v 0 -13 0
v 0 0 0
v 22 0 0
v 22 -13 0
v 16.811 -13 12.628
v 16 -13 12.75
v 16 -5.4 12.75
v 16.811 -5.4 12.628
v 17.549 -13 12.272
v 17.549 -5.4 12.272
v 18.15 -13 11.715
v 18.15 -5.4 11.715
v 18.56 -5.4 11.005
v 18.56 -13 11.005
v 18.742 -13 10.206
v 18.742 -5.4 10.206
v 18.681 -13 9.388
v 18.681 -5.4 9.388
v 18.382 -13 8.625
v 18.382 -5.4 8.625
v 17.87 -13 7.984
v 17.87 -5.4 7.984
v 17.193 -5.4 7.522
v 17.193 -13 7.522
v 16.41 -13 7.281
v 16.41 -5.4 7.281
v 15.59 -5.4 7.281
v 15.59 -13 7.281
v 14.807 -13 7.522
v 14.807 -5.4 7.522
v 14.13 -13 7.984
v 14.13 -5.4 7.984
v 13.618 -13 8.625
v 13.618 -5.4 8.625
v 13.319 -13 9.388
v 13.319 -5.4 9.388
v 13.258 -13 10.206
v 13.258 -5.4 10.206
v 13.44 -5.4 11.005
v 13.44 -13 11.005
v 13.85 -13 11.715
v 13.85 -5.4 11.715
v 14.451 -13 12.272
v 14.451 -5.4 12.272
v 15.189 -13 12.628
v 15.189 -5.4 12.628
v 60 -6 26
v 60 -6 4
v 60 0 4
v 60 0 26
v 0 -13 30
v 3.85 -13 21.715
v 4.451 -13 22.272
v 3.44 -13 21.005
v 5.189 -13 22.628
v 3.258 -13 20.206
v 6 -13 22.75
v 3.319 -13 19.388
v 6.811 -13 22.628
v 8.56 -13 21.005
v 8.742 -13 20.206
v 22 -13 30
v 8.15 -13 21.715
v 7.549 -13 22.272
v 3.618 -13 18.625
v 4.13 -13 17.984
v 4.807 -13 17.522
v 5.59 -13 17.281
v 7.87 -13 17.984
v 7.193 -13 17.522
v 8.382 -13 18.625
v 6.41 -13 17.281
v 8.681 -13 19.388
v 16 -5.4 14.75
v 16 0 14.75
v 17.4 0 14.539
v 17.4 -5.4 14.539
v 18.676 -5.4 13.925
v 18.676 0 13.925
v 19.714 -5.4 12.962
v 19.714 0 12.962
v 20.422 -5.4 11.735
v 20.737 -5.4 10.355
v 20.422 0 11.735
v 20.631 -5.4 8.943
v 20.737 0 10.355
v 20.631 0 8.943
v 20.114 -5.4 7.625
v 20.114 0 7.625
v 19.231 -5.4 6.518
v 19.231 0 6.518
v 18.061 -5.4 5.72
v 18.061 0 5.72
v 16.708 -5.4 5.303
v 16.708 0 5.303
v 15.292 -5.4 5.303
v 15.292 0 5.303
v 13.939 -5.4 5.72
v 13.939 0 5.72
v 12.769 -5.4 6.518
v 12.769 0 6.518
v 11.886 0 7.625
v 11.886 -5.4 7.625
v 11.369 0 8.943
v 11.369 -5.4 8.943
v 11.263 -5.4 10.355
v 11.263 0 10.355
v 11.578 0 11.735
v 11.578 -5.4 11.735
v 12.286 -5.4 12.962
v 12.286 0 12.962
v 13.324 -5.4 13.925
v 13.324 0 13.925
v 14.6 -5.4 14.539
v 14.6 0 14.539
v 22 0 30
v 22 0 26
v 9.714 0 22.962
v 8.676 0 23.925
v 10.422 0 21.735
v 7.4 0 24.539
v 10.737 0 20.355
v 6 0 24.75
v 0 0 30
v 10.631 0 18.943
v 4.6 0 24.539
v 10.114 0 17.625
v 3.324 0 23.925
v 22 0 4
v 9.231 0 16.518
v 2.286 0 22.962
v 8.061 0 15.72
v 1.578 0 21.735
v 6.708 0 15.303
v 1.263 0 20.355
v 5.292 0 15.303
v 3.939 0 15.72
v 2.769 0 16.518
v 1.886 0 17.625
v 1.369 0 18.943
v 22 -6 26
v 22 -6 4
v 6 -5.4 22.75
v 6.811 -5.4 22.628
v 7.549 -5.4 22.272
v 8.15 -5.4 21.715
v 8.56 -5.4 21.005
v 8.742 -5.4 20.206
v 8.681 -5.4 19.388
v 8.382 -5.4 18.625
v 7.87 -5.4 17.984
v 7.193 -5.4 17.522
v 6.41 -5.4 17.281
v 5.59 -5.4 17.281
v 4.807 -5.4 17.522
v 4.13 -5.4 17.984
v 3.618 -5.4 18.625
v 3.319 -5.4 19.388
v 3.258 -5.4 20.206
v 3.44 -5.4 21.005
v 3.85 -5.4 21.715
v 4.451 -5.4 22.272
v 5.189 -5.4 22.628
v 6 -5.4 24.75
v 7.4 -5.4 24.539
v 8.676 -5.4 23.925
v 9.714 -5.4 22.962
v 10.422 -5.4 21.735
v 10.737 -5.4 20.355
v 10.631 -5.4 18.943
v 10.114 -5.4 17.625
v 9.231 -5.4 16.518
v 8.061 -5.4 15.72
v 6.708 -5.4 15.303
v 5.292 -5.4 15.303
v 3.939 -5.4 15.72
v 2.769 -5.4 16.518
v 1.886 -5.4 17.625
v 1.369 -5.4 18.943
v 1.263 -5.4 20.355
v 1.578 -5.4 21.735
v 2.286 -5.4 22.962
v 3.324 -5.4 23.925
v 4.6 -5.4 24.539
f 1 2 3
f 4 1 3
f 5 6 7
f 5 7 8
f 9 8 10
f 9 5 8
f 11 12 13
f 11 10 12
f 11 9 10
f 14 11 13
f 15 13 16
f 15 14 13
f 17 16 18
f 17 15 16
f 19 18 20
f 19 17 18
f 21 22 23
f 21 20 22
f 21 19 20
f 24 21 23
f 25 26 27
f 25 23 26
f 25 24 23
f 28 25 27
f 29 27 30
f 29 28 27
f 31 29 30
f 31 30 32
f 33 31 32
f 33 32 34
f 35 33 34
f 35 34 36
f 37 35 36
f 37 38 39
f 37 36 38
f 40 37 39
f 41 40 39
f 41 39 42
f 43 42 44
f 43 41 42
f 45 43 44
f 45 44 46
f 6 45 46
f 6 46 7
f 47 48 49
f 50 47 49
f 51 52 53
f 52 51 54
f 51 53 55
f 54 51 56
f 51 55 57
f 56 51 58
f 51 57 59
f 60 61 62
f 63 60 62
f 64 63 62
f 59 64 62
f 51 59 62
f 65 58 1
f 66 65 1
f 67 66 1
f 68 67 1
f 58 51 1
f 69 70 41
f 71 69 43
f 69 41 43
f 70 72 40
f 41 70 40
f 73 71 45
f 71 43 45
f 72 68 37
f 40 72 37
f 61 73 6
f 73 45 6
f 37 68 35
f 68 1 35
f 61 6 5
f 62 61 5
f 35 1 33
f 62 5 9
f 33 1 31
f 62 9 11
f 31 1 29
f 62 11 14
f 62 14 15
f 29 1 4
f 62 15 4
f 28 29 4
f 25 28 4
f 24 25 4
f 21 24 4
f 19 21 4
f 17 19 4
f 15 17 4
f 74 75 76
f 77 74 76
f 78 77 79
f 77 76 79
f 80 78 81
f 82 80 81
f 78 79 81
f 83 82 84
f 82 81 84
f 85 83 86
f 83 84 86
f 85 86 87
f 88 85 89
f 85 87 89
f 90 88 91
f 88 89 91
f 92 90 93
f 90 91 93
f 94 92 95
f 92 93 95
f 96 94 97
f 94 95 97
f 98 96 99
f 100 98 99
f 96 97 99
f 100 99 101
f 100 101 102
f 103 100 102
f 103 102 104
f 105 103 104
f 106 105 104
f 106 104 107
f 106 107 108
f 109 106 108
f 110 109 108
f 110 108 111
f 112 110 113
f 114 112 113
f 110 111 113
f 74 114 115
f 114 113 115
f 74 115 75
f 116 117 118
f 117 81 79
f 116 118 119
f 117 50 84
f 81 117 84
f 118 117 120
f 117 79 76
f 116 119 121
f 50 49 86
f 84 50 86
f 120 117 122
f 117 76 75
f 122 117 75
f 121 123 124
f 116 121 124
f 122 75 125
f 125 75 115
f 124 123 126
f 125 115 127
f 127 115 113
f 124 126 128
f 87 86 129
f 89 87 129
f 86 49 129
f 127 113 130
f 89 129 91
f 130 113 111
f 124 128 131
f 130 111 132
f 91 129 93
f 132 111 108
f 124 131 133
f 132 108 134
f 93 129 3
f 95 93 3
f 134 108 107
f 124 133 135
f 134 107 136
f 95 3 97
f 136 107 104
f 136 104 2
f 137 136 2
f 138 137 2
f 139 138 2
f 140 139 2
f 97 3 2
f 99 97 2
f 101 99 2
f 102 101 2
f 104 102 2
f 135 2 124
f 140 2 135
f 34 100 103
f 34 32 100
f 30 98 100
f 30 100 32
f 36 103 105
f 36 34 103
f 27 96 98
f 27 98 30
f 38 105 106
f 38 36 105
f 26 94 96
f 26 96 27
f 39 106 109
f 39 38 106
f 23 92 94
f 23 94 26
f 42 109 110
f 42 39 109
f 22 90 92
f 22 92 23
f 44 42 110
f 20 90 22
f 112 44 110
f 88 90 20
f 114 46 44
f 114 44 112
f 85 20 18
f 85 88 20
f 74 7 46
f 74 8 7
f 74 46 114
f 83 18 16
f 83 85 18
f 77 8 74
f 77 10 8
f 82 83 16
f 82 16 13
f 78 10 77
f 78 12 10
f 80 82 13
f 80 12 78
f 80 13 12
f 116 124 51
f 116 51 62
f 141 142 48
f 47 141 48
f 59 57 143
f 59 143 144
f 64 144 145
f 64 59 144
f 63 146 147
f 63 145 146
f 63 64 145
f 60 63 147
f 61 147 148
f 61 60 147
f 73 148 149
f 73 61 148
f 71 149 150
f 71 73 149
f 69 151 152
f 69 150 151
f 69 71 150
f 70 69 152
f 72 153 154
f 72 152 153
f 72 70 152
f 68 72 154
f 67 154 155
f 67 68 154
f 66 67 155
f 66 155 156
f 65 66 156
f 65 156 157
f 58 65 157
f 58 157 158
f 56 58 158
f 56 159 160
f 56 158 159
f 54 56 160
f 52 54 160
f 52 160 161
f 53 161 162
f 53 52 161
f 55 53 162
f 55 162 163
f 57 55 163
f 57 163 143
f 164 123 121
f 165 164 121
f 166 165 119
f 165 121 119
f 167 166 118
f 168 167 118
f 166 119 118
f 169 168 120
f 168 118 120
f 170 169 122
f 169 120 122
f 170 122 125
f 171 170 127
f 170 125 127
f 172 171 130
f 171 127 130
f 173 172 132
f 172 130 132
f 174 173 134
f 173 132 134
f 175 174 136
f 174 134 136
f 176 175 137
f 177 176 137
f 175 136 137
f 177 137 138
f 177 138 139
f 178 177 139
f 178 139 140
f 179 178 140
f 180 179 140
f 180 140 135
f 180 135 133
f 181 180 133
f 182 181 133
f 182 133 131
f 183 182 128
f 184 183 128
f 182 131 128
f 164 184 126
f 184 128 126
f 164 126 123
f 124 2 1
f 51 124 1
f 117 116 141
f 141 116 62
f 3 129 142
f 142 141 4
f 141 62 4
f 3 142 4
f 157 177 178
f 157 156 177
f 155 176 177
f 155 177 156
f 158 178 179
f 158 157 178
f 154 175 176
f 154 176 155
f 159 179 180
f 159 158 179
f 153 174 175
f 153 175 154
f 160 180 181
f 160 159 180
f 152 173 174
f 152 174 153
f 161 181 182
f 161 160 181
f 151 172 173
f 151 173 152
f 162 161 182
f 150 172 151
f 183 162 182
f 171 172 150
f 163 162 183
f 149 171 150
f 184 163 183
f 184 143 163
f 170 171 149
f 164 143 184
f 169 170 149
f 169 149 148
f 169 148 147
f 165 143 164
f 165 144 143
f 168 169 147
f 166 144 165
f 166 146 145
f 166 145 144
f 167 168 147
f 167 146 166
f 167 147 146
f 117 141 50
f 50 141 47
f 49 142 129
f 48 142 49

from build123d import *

# Parameters (mm, degrees)
ESBO_O1_W                  = 38
ESBO_O1_H                  = 6
RESSALTO_EXTRUS_O1_DEPTH   = 30
CORTE_EXTRUS_O1_DEPTH      = 69.330081223
CORTE_EXTRUS_O1_DEPTH_BACK = 69.330081223
ESBO_O2_W                  = 38
ESBO_O2_H                  = 4
CORTE_EXTRUS_O2_DEPTH      = 69.330081223
CORTE_EXTRUS_O2_DEPTH_BACK = 69.330081223
ESBO_O4_R                  = 2.75
ESBO_O5_R                  = 4.75
CORTE_EXTRUS_O3_DEPTH      = 5.4


with BuildPart() as part:
    # Esboço1 → Ressalto-extrusão1 (new body)
    with BuildSketch(Plane.XY):
        Polygon((22, 0), (0, 0), (0, -13), (22, -13), (22, -6), align=None)
        with Locations((41, -3)):
            Rectangle(ESBO_O1_W, ESBO_O1_H)
    extrude(amount=RESSALTO_EXTRUS_O1_DEPTH)

    # Esboço2 → Corte-extrusão1 (cut, two sides: drawn at the far end of the back side and taken through both)
    with BuildSketch(Plane(origin=(0, 0, 0), x_dir=(1, 0, 0), z_dir=(0, 1, 0)).offset(-CORTE_EXTRUS_O1_DEPTH_BACK)):
        with Locations((41, -2)):
            Rectangle(ESBO_O2_W, ESBO_O2_H)
        with Locations((41, -28)):
            Rectangle(ESBO_O2_W, ESBO_O2_H)
    extrude(amount=CORTE_EXTRUS_O1_DEPTH + CORTE_EXTRUS_O1_DEPTH_BACK, mode=Mode.SUBTRACT)

    # Esboço4 → Corte-extrusão2 (cut, two sides: drawn at the far end of the back side and taken through both)
    with BuildSketch(Plane(origin=(0, 0, 0), x_dir=(1, 0, 0), z_dir=(0, 1, 0)).offset(-CORTE_EXTRUS_O2_DEPTH_BACK)):
        with Locations(Location((6, -20, 0), (0, 0, 270))):
            Circle(ESBO_O4_R)
        with Locations(Location((16, -10, 0), (0, 0, 270))):
            Circle(ESBO_O4_R)
    extrude(amount=CORTE_EXTRUS_O2_DEPTH + CORTE_EXTRUS_O2_DEPTH_BACK, mode=Mode.SUBTRACT)

    # Esboço5 → Corte-extrusão3 (cut)
    with BuildSketch(Plane(origin=(0, 0, 0), x_dir=(1, 0, 0), z_dir=(0, 1, 0))):
        with Locations(Location((6, -20, 0), (0, 0, 270))):
            Circle(ESBO_O5_R)
        with Locations(Location((16, -10, 0), (0, 0, 270))):
            Circle(ESBO_O5_R)
    extrude(amount=-CORTE_EXTRUS_O3_DEPTH, mode=Mode.SUBTRACT)


solid = part.part
